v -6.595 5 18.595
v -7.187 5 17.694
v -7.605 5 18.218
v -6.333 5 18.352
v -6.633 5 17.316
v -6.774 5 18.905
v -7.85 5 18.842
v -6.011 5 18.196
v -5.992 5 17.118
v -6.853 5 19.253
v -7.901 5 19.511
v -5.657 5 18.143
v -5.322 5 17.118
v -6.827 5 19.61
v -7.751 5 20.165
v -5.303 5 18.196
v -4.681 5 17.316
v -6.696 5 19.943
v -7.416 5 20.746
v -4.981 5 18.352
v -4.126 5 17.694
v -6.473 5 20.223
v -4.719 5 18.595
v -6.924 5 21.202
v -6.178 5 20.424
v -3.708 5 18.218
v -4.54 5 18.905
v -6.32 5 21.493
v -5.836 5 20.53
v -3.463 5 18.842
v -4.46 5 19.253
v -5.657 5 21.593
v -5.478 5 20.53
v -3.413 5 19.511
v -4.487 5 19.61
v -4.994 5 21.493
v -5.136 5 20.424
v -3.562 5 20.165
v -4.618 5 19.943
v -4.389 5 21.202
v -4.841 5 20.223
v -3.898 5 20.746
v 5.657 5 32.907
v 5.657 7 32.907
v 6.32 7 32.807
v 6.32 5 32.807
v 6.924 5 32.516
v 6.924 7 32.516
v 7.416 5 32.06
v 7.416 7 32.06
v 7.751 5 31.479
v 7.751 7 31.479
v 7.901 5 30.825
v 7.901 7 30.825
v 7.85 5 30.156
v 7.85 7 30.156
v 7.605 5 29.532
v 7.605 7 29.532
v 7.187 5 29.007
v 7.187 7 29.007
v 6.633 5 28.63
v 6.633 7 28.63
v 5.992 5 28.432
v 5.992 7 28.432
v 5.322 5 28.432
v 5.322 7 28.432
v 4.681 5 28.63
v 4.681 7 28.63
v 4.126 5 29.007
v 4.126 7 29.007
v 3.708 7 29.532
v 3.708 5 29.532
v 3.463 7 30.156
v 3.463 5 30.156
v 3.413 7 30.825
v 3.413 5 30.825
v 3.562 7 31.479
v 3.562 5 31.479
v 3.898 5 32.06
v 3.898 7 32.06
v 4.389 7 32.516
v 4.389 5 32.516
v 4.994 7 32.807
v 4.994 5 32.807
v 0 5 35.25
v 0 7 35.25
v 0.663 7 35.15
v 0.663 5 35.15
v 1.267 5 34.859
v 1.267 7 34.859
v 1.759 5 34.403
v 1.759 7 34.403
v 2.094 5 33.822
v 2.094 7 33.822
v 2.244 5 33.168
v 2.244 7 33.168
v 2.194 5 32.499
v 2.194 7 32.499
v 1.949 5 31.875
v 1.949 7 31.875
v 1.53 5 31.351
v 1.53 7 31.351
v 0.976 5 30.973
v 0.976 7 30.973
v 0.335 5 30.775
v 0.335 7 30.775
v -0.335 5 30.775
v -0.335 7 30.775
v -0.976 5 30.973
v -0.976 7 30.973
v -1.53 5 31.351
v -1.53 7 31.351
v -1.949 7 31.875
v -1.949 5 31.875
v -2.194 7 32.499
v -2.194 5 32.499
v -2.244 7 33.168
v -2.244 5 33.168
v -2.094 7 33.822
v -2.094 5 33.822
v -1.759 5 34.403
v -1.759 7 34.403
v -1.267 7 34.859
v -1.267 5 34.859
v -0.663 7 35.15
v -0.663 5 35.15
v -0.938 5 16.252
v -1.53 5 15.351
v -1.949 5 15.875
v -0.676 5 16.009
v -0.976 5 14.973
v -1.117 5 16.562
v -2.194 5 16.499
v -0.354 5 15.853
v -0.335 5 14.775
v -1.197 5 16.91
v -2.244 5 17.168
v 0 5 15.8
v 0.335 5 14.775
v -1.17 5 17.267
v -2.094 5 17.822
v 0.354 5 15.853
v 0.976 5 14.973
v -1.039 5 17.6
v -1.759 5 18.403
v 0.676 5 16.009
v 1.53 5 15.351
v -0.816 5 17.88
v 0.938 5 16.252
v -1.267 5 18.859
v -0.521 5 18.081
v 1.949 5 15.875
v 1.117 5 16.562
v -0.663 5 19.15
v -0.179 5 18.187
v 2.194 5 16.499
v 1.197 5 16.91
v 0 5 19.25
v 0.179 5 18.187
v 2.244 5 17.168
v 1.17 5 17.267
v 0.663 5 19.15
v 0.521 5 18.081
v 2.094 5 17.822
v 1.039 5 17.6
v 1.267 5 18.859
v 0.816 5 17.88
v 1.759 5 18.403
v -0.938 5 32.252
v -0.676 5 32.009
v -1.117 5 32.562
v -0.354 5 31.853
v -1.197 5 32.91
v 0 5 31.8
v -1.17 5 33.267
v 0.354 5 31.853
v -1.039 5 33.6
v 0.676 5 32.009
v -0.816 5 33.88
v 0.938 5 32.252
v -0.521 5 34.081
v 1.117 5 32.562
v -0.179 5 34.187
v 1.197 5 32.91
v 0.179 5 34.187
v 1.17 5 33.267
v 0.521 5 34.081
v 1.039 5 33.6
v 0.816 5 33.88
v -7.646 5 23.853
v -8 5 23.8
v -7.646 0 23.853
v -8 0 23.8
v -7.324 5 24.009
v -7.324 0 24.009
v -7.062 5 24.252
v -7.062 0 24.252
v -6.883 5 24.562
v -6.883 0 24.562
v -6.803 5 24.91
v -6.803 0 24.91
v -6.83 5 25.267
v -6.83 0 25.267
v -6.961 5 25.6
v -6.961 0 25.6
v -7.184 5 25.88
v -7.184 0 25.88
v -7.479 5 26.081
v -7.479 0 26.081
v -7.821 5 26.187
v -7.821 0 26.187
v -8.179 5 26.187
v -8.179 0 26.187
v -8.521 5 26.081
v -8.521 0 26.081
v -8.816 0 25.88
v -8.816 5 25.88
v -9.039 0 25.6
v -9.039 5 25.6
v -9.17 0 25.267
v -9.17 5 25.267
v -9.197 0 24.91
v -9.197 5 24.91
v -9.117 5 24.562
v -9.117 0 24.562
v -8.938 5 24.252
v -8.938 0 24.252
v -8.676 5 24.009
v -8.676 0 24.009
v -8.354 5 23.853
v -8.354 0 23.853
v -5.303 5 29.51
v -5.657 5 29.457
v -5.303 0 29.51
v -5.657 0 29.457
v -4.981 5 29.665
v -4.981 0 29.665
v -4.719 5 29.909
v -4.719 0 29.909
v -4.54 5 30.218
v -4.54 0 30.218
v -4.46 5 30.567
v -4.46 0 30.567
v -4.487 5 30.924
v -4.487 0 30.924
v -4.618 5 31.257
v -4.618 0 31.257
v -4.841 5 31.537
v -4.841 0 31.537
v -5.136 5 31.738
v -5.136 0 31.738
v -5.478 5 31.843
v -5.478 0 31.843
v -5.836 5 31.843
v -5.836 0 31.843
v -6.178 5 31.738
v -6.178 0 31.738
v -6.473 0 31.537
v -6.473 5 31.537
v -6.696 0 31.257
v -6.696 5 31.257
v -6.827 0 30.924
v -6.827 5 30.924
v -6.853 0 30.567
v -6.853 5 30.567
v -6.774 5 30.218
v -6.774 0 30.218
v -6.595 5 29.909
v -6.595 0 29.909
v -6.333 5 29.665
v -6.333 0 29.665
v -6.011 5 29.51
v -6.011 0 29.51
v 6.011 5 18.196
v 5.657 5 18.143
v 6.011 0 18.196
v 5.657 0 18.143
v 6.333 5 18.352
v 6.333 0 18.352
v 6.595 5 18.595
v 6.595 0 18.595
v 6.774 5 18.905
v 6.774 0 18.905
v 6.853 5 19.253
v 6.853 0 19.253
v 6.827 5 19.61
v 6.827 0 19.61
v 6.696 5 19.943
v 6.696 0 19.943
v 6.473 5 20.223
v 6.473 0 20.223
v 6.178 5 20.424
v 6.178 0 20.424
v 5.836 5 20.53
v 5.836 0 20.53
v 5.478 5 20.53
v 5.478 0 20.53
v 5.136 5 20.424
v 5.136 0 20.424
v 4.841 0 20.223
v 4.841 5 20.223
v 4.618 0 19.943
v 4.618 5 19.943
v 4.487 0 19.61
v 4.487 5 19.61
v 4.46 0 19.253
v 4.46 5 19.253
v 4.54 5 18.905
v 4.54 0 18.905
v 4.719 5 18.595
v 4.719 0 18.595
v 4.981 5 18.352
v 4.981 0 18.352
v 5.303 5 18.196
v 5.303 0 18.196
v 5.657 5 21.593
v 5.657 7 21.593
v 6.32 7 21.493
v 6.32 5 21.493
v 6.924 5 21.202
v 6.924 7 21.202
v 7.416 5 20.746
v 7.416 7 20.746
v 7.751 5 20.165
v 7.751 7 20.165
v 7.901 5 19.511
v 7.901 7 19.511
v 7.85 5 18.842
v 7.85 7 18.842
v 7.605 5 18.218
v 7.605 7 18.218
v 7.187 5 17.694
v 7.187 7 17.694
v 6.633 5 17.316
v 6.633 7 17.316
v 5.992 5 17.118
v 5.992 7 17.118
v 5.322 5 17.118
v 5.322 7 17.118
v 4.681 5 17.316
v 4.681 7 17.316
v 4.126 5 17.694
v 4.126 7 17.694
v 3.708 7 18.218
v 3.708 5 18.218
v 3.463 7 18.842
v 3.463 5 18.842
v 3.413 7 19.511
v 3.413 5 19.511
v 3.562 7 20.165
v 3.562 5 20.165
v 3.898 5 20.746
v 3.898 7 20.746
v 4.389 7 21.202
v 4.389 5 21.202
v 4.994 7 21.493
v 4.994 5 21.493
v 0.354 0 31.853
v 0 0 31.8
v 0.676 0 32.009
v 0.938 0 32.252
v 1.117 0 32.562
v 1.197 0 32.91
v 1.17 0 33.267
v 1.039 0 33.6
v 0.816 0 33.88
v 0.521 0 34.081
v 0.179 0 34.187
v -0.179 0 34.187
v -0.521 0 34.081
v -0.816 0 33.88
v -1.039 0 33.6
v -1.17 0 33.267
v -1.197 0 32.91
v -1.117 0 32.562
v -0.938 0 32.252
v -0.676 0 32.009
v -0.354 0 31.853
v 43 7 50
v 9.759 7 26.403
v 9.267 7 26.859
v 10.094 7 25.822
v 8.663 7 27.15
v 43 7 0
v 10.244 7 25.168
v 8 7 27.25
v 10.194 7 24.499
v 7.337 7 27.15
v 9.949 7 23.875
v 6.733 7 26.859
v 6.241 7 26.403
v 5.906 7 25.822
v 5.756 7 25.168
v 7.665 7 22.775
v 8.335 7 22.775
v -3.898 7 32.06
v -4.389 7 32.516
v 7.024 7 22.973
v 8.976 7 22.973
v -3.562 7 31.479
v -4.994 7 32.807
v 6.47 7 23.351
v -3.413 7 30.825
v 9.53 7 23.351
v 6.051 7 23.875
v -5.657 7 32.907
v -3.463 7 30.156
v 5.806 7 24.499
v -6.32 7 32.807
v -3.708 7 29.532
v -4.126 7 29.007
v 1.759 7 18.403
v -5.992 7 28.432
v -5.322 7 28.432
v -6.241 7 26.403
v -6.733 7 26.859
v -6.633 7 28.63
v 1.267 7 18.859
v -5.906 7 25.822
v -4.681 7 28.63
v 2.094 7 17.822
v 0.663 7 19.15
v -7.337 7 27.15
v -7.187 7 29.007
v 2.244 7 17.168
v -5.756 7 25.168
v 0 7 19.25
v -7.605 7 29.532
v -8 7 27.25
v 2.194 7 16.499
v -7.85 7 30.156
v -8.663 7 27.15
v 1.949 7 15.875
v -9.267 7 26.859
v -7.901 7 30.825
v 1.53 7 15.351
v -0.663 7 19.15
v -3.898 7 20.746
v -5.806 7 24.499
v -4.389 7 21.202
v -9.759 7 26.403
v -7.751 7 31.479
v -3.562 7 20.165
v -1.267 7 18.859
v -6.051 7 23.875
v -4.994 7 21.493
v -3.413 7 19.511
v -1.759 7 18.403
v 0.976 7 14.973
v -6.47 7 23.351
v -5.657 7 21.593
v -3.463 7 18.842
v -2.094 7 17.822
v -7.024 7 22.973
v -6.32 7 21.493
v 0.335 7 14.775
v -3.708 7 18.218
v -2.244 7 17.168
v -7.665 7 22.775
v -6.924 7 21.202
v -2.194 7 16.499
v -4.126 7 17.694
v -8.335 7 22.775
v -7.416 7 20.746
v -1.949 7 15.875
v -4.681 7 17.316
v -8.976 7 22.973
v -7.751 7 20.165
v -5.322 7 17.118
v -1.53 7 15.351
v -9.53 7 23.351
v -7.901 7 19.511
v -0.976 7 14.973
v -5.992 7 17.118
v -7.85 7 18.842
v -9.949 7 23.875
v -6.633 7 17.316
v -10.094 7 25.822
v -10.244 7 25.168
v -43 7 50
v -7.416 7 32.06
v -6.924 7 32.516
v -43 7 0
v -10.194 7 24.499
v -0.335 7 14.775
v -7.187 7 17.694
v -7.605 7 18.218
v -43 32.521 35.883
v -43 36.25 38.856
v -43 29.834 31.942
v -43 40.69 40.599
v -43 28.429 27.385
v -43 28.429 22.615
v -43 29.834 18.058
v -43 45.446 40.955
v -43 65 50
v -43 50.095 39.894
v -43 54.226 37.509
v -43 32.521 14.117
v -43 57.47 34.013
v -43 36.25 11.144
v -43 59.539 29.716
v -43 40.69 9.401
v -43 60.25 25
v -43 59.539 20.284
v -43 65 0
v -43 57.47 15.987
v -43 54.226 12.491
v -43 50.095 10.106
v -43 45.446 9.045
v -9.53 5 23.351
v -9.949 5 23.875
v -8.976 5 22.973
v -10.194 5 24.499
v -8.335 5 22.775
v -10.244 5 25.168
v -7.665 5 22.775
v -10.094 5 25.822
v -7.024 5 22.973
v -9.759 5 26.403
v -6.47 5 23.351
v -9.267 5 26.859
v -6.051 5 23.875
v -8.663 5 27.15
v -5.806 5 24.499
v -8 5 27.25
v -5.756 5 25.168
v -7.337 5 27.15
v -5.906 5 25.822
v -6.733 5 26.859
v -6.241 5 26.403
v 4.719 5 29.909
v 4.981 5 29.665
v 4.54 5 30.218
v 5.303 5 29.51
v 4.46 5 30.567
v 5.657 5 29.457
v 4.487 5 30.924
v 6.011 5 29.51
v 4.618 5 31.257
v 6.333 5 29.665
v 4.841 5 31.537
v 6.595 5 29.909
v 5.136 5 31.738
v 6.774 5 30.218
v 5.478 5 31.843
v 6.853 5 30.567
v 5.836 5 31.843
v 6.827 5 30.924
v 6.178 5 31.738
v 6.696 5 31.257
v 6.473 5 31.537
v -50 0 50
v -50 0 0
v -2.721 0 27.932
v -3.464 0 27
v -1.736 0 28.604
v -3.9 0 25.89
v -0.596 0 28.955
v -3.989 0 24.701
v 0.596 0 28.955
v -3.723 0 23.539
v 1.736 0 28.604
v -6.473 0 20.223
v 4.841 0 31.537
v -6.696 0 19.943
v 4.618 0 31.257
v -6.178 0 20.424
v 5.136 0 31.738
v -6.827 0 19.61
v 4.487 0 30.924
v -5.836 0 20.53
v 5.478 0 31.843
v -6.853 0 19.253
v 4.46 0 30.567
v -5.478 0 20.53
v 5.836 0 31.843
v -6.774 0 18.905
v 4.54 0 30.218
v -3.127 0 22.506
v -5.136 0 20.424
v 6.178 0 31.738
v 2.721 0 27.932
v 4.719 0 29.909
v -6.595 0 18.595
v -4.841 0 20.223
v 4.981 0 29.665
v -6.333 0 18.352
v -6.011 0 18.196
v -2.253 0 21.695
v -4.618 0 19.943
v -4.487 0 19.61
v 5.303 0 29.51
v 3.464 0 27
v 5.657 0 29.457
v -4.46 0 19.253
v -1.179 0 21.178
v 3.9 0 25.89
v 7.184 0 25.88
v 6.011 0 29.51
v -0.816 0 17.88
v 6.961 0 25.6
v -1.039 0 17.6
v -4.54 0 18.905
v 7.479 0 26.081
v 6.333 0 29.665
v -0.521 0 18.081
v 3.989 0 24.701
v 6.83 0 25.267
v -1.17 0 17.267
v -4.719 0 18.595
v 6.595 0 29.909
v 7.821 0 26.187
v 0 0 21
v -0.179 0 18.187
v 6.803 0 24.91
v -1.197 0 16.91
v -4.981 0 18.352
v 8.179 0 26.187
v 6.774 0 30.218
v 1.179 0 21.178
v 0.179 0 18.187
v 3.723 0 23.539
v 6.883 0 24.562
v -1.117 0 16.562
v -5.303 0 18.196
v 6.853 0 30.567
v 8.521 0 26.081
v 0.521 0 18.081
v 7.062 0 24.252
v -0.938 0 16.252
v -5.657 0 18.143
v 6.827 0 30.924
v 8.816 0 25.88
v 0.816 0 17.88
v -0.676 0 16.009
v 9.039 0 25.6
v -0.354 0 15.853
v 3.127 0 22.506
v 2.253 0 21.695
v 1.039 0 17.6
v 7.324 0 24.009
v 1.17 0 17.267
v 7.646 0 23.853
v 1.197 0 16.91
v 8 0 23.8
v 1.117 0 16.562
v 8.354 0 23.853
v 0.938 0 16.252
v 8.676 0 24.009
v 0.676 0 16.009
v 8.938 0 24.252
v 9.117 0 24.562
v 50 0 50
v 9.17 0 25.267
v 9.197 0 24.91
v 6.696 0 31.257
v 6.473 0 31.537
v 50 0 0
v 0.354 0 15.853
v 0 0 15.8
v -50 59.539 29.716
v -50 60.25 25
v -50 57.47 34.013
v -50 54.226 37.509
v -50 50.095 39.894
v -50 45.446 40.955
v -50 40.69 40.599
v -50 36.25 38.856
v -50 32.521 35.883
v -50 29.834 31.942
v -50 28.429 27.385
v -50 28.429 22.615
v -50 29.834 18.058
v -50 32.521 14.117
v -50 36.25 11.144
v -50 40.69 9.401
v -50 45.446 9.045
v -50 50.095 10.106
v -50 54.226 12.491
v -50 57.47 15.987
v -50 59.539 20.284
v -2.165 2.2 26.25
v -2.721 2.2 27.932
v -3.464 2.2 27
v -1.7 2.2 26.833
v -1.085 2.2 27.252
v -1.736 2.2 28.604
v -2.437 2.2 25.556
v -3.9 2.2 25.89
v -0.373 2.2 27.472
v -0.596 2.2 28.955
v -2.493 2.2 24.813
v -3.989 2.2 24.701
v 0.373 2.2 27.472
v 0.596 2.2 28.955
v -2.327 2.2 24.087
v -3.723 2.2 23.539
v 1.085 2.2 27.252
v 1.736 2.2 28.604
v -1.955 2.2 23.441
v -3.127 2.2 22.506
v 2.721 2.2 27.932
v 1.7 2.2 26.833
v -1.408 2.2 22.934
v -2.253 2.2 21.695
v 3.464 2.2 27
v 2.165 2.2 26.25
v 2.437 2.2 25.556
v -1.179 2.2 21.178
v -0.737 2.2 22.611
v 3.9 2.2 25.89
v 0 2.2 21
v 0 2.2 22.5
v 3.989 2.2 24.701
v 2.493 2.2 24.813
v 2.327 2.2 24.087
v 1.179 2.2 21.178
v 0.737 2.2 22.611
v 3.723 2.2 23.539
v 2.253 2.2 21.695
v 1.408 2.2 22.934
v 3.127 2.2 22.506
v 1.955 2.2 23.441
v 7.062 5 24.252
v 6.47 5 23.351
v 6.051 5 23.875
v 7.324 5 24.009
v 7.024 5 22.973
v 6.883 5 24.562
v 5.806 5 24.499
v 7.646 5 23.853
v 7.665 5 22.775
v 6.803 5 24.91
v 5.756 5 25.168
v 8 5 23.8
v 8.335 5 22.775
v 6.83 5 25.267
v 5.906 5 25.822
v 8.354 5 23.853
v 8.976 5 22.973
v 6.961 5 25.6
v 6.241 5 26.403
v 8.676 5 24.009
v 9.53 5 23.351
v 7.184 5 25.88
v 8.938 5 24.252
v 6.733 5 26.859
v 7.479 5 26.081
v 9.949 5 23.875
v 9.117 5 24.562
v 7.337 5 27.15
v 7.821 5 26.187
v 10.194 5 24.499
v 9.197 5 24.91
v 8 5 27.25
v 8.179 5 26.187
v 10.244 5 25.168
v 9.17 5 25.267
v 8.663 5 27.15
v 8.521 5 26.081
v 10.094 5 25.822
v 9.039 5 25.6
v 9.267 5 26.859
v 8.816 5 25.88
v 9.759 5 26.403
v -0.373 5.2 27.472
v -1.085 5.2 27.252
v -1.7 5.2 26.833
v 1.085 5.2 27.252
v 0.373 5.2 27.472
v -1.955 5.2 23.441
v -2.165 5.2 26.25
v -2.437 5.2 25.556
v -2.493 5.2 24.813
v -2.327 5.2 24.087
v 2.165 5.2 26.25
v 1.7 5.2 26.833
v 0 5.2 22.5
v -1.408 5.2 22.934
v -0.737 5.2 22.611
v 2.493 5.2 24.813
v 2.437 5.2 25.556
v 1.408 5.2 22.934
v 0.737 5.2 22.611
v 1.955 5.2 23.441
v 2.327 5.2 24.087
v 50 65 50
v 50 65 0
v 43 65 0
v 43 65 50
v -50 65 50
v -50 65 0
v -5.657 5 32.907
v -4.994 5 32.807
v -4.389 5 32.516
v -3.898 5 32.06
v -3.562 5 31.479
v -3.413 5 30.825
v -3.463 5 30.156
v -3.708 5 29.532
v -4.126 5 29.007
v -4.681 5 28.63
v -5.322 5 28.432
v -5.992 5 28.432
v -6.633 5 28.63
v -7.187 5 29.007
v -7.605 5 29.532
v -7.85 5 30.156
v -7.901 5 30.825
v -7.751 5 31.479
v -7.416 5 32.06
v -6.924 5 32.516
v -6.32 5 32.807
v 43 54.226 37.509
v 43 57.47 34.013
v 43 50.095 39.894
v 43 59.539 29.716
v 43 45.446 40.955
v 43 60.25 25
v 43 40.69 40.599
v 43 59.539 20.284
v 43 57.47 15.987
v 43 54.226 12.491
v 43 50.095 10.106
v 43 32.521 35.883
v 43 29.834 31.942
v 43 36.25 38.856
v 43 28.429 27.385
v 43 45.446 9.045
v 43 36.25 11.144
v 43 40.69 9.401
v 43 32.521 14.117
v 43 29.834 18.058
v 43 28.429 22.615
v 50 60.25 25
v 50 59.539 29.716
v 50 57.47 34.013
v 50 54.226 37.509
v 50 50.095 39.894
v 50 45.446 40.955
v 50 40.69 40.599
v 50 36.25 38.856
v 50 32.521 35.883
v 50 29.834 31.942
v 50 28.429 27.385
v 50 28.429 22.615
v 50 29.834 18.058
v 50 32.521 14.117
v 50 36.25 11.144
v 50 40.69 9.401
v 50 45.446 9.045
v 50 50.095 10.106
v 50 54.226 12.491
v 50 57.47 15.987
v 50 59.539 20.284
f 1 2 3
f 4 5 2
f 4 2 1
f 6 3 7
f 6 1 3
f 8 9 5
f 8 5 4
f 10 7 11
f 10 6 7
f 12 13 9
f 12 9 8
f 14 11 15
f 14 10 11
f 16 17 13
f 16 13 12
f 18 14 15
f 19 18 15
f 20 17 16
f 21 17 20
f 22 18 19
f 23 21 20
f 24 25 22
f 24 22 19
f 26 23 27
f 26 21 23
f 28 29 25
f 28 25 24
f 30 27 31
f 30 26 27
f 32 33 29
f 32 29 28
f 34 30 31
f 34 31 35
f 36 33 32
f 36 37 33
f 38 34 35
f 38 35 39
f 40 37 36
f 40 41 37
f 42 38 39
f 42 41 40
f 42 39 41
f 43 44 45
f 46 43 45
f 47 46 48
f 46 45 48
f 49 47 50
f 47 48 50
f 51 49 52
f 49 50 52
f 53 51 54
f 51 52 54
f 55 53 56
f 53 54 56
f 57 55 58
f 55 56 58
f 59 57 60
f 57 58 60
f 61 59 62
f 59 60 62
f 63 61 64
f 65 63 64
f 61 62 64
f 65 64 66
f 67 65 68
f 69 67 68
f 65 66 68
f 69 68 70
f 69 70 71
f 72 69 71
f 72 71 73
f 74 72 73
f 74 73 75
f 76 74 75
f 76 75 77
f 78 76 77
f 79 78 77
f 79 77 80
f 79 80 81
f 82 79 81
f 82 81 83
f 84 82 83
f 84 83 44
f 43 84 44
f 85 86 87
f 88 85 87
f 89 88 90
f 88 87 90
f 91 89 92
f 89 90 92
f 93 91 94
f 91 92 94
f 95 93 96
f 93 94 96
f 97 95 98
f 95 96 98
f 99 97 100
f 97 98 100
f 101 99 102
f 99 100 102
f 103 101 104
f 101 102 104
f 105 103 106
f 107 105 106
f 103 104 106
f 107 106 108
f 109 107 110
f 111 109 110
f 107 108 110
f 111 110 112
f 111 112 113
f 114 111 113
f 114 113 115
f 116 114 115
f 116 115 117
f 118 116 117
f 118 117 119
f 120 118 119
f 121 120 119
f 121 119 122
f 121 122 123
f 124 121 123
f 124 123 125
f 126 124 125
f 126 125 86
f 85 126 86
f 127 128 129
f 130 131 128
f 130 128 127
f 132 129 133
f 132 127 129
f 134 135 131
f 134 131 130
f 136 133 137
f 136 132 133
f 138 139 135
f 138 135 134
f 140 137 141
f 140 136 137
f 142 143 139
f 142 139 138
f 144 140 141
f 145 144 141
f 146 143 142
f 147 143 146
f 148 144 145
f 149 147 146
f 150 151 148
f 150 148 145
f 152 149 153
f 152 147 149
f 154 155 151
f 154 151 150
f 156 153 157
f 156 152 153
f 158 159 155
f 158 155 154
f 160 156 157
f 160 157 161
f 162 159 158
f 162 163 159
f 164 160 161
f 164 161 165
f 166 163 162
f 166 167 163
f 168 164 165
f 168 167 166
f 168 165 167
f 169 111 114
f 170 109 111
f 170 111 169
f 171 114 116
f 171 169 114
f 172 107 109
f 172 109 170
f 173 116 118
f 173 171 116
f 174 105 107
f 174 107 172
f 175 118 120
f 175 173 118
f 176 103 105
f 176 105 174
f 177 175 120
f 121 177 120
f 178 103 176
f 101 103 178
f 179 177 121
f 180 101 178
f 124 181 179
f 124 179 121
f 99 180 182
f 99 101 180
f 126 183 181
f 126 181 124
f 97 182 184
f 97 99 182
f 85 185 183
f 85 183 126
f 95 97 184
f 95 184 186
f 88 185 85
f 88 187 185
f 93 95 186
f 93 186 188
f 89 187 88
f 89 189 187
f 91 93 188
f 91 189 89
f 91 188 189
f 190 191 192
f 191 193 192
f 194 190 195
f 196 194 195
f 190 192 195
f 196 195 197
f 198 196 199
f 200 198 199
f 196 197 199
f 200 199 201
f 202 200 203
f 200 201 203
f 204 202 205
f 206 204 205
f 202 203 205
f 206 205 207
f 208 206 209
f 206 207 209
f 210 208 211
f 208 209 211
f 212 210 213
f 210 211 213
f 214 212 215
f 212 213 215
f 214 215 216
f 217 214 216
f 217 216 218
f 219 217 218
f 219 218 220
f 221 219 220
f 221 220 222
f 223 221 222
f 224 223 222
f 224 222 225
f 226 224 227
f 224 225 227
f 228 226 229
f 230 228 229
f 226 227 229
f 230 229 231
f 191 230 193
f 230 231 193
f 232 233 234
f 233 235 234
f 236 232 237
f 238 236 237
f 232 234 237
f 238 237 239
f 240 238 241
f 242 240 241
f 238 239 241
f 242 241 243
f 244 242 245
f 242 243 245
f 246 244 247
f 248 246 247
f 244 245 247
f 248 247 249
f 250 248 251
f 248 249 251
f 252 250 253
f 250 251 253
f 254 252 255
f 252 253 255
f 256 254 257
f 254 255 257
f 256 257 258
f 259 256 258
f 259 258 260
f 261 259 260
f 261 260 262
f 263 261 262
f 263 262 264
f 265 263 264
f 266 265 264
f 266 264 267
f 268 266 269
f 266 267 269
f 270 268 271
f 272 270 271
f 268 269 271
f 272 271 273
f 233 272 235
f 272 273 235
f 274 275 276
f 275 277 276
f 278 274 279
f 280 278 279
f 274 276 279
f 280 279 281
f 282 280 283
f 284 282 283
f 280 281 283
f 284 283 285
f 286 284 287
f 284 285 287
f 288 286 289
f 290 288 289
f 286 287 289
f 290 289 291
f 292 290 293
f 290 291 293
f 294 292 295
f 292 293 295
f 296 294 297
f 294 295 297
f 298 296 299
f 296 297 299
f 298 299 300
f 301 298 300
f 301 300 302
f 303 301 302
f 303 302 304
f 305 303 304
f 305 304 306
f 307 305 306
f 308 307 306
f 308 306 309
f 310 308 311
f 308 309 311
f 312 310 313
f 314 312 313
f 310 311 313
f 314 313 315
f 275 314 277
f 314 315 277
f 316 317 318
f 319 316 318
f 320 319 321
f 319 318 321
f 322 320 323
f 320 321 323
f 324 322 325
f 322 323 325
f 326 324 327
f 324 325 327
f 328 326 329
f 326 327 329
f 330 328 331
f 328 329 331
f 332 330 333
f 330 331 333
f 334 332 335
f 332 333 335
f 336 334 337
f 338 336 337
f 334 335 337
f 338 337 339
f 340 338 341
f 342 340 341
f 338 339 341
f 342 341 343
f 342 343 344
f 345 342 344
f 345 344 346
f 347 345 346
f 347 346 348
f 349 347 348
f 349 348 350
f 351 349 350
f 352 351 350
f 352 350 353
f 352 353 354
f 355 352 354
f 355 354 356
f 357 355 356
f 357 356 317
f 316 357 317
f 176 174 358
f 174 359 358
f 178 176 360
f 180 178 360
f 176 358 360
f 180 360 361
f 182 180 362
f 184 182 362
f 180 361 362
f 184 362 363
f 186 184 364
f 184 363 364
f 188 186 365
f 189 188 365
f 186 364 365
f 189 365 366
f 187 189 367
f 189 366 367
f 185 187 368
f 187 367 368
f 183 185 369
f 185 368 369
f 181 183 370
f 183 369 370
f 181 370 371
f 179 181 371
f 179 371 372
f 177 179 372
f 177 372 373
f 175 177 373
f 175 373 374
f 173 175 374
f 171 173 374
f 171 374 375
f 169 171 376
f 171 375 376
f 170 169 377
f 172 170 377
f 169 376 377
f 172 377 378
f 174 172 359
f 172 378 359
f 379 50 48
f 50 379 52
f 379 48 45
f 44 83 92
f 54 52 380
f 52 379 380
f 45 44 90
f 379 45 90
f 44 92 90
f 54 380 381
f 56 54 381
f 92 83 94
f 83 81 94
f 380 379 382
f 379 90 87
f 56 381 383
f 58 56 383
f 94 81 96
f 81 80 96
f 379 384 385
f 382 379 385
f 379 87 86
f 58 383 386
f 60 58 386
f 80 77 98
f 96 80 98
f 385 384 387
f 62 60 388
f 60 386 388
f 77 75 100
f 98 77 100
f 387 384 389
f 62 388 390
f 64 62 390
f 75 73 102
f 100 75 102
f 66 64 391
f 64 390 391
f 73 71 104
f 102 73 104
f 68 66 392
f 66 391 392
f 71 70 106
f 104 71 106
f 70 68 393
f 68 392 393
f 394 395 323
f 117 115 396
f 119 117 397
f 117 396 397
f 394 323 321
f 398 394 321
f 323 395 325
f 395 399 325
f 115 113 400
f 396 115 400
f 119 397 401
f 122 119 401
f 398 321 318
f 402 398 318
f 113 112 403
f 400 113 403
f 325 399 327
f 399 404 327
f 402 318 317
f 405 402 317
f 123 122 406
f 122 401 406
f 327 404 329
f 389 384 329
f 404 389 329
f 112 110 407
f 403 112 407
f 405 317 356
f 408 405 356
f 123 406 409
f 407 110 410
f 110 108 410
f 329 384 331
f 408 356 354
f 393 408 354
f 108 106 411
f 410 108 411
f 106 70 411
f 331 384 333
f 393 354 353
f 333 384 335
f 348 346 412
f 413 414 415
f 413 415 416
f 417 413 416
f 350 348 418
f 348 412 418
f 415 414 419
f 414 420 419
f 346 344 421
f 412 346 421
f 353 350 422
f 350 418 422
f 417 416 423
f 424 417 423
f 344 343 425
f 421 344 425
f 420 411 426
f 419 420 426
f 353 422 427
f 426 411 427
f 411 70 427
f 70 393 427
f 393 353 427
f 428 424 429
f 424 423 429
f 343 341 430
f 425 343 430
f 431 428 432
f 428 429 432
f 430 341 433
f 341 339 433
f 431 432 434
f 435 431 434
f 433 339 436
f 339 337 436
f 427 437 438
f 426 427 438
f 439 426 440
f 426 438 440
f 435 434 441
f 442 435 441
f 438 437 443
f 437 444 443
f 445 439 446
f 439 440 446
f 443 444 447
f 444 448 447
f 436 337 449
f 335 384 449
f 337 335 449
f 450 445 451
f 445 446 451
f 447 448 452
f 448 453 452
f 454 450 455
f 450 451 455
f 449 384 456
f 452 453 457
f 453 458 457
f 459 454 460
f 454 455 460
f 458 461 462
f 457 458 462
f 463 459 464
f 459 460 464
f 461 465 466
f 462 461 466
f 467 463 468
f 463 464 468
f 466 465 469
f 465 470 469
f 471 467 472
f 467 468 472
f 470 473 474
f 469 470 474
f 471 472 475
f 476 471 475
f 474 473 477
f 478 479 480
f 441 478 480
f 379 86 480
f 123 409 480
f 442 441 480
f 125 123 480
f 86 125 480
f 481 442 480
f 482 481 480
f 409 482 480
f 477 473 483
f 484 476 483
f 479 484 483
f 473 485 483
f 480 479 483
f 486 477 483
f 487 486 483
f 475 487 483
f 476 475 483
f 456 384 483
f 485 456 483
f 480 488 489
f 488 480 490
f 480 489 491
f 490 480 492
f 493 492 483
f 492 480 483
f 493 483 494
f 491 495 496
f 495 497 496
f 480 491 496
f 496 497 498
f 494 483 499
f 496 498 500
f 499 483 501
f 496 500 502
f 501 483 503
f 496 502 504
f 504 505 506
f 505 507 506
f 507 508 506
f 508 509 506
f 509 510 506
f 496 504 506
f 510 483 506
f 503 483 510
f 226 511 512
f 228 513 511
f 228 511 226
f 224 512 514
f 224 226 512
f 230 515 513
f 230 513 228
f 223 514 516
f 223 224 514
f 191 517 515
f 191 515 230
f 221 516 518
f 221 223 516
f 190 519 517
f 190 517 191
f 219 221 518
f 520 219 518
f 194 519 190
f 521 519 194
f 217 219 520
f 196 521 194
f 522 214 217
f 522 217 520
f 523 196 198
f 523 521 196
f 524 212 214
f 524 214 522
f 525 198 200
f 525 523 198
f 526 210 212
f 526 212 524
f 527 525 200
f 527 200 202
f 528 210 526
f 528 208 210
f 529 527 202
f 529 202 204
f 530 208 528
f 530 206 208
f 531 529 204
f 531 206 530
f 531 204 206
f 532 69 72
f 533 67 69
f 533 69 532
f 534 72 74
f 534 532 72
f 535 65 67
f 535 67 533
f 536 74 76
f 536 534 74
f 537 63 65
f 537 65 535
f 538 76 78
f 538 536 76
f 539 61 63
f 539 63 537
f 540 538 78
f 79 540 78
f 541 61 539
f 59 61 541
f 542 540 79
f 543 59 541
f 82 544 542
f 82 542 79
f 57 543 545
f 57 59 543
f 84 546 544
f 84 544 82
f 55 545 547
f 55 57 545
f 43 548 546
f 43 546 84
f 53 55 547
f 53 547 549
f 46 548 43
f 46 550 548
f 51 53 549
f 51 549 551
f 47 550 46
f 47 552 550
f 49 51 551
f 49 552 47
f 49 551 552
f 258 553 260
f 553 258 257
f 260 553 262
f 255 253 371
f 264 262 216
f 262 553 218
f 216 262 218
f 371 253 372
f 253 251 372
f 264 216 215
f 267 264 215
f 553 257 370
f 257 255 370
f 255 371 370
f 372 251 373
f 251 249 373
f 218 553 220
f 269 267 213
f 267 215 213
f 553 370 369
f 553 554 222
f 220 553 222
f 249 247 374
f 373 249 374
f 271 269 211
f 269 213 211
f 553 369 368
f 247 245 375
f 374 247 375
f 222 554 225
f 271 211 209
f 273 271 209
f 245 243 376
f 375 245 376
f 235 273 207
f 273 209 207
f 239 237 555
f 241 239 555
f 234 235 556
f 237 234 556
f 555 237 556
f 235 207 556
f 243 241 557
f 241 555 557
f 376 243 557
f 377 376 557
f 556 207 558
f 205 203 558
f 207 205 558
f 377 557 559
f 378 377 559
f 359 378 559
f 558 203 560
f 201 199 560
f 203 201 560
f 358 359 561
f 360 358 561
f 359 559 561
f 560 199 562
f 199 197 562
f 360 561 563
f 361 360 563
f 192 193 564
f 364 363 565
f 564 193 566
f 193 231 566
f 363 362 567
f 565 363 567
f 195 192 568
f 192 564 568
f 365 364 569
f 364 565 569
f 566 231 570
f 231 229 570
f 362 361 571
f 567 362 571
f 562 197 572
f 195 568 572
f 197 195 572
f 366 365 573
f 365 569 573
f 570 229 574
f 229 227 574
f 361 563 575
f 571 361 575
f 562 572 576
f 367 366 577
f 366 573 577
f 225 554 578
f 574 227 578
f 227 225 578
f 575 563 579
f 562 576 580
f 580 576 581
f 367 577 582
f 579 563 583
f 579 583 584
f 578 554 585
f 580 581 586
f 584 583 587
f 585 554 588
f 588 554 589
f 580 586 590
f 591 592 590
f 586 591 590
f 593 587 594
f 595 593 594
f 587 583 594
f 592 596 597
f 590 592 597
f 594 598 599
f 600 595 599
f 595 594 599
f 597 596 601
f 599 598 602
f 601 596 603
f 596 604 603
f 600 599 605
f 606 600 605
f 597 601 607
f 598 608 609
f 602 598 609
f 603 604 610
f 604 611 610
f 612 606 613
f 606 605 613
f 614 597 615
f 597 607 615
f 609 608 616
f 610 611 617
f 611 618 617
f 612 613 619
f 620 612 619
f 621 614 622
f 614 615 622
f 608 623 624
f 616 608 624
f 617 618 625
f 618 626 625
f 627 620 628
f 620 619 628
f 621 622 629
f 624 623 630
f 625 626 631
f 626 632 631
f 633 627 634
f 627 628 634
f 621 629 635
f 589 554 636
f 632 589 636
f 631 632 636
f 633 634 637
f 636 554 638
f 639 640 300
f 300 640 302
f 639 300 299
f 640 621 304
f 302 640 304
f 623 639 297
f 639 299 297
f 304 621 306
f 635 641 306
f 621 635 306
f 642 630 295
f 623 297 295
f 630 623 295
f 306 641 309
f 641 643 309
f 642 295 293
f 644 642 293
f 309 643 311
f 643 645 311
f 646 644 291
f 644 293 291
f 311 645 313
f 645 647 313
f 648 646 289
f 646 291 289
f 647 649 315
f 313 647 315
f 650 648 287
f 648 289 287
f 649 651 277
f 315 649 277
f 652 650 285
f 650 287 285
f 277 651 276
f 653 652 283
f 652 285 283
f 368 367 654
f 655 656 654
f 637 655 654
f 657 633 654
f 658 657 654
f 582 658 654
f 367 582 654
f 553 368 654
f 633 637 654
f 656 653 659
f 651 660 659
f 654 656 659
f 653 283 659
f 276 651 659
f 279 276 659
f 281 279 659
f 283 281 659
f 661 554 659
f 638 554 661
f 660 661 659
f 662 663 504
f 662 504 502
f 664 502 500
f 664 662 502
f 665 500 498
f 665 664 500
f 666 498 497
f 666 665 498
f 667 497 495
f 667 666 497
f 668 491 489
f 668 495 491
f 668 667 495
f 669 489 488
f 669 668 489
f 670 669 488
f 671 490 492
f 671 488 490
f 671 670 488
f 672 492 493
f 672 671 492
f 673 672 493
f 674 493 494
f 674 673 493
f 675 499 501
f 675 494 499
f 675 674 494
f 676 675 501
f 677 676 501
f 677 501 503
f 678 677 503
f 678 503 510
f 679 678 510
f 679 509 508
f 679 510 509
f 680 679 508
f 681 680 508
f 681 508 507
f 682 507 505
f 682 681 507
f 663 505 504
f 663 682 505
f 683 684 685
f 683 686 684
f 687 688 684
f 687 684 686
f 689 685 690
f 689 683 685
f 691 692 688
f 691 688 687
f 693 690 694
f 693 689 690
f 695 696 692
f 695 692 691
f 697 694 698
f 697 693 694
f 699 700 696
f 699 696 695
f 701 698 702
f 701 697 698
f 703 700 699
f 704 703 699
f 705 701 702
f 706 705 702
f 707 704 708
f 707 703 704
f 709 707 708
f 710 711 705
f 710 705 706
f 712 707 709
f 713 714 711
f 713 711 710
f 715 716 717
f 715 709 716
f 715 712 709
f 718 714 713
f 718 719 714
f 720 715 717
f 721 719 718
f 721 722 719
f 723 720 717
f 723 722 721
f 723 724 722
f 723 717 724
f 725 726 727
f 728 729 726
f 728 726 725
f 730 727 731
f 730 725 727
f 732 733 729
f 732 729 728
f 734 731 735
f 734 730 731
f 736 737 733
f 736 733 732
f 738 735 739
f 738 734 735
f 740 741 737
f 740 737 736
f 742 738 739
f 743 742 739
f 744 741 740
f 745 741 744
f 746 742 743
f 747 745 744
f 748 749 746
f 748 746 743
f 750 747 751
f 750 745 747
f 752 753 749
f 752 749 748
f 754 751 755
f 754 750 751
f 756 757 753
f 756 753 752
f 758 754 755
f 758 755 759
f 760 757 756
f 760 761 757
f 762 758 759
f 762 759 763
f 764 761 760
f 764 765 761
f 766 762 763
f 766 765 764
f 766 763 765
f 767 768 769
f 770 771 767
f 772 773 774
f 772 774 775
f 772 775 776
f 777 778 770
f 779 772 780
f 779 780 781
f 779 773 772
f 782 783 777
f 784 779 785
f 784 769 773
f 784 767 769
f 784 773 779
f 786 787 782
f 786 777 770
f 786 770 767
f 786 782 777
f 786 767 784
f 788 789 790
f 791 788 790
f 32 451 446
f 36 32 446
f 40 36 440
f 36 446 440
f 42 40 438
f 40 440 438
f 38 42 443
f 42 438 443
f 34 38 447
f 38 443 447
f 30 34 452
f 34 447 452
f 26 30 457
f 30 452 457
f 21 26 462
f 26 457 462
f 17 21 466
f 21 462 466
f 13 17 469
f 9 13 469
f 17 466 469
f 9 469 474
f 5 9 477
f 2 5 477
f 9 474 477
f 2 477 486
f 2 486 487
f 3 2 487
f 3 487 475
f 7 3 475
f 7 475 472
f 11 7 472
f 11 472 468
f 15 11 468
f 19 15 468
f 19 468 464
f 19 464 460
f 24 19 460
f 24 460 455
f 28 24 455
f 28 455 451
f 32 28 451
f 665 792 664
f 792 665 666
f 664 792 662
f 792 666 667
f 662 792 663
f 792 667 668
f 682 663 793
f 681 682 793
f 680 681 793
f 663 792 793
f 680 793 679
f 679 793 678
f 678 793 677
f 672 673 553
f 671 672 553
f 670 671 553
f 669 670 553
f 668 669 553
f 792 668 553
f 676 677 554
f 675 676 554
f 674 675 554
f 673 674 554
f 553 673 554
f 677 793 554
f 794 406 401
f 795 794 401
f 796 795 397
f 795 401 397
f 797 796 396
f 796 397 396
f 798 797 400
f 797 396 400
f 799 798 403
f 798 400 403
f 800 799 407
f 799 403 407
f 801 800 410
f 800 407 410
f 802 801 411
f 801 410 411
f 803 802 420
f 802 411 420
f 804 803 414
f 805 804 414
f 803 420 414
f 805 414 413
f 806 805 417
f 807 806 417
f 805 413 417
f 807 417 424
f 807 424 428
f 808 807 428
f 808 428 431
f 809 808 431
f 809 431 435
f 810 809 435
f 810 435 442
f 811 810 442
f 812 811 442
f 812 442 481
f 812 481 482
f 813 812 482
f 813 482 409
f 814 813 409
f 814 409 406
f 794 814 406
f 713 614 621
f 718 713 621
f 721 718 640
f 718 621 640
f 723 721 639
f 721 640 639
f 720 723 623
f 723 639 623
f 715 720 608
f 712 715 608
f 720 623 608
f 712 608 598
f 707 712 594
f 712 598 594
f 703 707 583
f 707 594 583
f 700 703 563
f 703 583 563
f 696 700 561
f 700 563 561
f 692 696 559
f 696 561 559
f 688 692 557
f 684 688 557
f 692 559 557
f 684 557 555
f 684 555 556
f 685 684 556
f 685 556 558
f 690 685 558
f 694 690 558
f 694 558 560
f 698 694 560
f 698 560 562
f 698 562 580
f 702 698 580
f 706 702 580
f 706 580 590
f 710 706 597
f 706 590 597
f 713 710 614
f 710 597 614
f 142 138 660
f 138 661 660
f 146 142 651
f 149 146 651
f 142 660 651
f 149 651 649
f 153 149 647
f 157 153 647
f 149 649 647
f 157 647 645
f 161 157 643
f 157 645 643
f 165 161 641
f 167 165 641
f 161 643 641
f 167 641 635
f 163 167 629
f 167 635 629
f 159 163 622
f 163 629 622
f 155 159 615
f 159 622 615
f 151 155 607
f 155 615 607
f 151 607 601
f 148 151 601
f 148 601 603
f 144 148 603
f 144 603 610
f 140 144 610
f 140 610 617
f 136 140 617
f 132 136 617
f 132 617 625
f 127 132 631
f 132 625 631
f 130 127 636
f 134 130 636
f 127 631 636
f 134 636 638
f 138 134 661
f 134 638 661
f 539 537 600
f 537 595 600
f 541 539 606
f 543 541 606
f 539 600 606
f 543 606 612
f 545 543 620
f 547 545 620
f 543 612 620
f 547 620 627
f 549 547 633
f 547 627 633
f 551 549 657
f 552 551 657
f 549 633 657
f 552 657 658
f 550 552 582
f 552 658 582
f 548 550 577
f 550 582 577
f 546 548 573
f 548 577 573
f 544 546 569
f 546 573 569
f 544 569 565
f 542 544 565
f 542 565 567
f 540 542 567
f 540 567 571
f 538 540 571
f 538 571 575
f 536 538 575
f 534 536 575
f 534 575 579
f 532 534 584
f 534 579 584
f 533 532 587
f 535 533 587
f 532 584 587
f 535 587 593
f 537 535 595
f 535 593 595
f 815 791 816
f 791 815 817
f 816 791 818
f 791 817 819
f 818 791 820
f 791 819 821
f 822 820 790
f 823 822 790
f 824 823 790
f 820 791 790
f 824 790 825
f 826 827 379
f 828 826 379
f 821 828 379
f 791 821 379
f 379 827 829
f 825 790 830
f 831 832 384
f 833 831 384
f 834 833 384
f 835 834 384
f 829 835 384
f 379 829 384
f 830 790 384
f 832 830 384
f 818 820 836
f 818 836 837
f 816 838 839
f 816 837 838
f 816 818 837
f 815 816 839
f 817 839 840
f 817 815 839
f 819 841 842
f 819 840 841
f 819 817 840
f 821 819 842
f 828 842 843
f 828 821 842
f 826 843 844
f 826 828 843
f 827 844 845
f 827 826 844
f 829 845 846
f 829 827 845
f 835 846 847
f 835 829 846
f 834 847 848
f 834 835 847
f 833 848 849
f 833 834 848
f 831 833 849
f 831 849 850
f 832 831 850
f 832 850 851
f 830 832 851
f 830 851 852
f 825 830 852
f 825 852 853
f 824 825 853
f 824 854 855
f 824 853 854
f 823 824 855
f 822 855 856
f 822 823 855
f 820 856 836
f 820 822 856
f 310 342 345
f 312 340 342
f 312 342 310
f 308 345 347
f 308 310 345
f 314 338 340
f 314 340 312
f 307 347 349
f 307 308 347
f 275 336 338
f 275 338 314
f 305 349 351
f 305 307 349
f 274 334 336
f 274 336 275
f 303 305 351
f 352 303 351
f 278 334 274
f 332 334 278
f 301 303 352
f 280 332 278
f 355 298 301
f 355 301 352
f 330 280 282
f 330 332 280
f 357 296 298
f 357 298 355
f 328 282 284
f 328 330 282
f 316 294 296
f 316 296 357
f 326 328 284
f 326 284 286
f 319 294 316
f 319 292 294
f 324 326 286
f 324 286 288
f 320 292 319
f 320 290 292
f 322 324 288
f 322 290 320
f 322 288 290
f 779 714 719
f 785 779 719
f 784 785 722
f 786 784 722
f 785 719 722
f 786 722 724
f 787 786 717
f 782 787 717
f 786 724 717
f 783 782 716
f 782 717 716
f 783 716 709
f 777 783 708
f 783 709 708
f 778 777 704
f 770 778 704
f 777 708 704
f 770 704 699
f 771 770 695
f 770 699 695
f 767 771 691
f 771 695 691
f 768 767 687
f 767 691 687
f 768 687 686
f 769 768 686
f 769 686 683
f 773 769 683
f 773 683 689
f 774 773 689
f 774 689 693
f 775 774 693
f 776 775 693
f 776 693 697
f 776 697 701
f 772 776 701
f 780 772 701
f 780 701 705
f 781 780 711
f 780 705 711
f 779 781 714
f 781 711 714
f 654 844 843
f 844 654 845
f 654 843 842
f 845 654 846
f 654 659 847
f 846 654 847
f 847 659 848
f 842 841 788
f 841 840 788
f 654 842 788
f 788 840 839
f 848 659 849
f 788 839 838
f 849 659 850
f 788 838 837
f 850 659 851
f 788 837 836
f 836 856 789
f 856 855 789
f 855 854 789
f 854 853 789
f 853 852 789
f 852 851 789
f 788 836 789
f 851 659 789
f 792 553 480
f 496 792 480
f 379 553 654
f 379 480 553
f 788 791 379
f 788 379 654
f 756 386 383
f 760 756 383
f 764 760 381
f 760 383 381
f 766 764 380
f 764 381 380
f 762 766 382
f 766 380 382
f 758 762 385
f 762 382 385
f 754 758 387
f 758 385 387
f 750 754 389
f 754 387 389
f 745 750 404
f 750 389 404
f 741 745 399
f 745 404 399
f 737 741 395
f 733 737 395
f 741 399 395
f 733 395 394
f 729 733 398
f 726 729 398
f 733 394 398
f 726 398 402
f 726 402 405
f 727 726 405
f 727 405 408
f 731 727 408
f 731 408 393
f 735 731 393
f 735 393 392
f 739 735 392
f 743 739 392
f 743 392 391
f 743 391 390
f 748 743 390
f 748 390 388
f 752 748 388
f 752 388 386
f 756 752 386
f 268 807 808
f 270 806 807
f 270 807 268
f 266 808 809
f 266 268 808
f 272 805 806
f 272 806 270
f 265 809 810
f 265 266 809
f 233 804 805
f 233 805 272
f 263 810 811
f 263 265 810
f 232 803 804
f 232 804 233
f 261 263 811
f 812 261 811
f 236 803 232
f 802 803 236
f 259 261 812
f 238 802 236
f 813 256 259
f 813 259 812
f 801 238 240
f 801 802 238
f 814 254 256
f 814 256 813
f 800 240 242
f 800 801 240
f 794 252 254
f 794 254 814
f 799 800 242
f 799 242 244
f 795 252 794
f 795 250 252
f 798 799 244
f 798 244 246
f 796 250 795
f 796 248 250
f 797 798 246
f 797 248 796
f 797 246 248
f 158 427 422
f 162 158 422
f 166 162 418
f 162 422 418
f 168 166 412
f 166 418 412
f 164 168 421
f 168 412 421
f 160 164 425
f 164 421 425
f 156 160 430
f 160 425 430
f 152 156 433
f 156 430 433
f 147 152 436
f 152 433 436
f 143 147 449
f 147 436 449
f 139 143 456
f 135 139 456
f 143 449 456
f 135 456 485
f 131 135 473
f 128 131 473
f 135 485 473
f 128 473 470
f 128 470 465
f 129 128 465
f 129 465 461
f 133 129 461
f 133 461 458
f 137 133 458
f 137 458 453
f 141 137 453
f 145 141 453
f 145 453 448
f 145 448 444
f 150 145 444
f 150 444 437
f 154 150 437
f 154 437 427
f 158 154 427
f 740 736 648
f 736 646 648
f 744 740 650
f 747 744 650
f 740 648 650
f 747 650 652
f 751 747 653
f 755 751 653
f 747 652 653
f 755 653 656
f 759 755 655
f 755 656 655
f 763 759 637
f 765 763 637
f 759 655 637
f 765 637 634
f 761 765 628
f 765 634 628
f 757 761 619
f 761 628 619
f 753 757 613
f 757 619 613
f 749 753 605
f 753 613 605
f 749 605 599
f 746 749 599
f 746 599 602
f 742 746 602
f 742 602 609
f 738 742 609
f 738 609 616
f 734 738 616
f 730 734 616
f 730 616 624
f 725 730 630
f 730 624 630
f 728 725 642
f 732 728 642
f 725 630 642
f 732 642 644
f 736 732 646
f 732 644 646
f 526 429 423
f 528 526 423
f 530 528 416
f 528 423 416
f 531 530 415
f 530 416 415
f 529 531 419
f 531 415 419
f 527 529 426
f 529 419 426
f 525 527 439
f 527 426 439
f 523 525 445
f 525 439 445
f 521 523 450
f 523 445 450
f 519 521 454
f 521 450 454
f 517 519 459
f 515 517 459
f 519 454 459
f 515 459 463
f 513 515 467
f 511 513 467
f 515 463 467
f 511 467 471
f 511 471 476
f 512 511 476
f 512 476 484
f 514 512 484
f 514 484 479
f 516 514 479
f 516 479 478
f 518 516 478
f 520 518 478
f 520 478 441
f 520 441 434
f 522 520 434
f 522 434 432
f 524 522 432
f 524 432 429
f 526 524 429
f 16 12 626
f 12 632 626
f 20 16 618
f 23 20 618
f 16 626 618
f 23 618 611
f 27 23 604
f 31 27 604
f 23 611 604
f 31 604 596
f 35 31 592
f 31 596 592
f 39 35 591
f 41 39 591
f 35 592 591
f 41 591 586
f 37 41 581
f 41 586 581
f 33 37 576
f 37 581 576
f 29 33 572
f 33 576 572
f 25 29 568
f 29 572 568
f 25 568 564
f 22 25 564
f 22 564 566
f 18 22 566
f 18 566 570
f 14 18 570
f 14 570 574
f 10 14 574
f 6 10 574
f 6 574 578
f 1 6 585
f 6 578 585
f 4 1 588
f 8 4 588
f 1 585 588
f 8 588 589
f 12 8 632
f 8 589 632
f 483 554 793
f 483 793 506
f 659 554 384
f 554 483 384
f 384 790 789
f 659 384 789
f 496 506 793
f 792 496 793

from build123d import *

# Parameters (mm, degrees)
BOSS_EXTRUDE1_DEPTH                             = 50
CBORE_FOR_M2_SOCKET_HEAD_CAP_SCREW1_D           = 2.4
CBORE_FOR_M2_SOCKET_HEAD_CAP_SCREW1_CBORE_D     = 4.5
CBORE_FOR_M2_SOCKET_HEAD_CAP_SCREW1_CBORE_DEPTH = 2
SKETCH7_R                                       = 4
CUT_EXTRUDE2_DEPTH                              = 2.2
SKETCH8_R                                       = 2.5
CUT_EXTRUDE3_DEPTH                              = 3
CUT_EXTRUDE4_DEPTH                              = 124.991935222
CUT_EXTRUDE4_DEPTH_BACK                         = 124.991935222
SKETCH3_R                                       = 16


with BuildPart() as part:
    # Sketch1 → Boss-Extrude1 (new body)
    with BuildSketch(Plane.XY):
        Polygon((-50, 0), (50, 0), (50, 65), (43, 65), (43, 7), (-43, 7), (-43, 65), (-50, 65), align=None)
    extrude(amount=BOSS_EXTRUDE1_DEPTH)

    # CBORE for M2 Socket Head Cap Screw1 (through all)
    with Locations(Plane(origin=(0, 7, 17), x_dir=(0, 0, 1), z_dir=(0, 1, 0))):
        with Locations((0, 0), (2.343145751, 5.656854249), (8, 8), (13.656854249, 5.656854249), (16, 0), (13.656854249, -5.656854249), (8, -8), (2.343145751, -5.656854249)):
            CounterBoreHole(CBORE_FOR_M2_SOCKET_HEAD_CAP_SCREW1_D / 2, CBORE_FOR_M2_SOCKET_HEAD_CAP_SCREW1_CBORE_D / 2, CBORE_FOR_M2_SOCKET_HEAD_CAP_SCREW1_CBORE_DEPTH)

    # Sketch7 → Cut-Extrude2 (cut)
    with BuildSketch(Plane.XZ):
        with Locations(Location((0, 25, 0), (0, 0, 270))):
            Circle(SKETCH7_R)
    extrude(amount=-CUT_EXTRUDE2_DEPTH, mode=Mode.SUBTRACT)

    # Sketch8 → Cut-Extrude3 (cut)
    with BuildSketch(Plane.XZ.offset(-2.2)):
        with Locations(Location((0, 25, 0), (0, 0, 270))):
            Circle(SKETCH8_R)
    extrude(amount=-CUT_EXTRUDE3_DEPTH, mode=Mode.SUBTRACT)

    # Sketch3 → Cut-Extrude4 (cut, two sides: drawn at the far end of the back side and taken through both)
    with BuildSketch(Plane(origin=(43, 0, 0), x_dir=(0, 0, -1), z_dir=(1, 0, 0)).offset(-CUT_EXTRUDE4_DEPTH_BACK)):
        with Locations(Location((-25, 44.25, 0), (0, 0, 90))):
            Circle(SKETCH3_R)
    extrude(amount=CUT_EXTRUDE4_DEPTH + CUT_EXTRUDE4_DEPTH_BACK, mode=Mode.SUBTRACT)


solid = part.part
